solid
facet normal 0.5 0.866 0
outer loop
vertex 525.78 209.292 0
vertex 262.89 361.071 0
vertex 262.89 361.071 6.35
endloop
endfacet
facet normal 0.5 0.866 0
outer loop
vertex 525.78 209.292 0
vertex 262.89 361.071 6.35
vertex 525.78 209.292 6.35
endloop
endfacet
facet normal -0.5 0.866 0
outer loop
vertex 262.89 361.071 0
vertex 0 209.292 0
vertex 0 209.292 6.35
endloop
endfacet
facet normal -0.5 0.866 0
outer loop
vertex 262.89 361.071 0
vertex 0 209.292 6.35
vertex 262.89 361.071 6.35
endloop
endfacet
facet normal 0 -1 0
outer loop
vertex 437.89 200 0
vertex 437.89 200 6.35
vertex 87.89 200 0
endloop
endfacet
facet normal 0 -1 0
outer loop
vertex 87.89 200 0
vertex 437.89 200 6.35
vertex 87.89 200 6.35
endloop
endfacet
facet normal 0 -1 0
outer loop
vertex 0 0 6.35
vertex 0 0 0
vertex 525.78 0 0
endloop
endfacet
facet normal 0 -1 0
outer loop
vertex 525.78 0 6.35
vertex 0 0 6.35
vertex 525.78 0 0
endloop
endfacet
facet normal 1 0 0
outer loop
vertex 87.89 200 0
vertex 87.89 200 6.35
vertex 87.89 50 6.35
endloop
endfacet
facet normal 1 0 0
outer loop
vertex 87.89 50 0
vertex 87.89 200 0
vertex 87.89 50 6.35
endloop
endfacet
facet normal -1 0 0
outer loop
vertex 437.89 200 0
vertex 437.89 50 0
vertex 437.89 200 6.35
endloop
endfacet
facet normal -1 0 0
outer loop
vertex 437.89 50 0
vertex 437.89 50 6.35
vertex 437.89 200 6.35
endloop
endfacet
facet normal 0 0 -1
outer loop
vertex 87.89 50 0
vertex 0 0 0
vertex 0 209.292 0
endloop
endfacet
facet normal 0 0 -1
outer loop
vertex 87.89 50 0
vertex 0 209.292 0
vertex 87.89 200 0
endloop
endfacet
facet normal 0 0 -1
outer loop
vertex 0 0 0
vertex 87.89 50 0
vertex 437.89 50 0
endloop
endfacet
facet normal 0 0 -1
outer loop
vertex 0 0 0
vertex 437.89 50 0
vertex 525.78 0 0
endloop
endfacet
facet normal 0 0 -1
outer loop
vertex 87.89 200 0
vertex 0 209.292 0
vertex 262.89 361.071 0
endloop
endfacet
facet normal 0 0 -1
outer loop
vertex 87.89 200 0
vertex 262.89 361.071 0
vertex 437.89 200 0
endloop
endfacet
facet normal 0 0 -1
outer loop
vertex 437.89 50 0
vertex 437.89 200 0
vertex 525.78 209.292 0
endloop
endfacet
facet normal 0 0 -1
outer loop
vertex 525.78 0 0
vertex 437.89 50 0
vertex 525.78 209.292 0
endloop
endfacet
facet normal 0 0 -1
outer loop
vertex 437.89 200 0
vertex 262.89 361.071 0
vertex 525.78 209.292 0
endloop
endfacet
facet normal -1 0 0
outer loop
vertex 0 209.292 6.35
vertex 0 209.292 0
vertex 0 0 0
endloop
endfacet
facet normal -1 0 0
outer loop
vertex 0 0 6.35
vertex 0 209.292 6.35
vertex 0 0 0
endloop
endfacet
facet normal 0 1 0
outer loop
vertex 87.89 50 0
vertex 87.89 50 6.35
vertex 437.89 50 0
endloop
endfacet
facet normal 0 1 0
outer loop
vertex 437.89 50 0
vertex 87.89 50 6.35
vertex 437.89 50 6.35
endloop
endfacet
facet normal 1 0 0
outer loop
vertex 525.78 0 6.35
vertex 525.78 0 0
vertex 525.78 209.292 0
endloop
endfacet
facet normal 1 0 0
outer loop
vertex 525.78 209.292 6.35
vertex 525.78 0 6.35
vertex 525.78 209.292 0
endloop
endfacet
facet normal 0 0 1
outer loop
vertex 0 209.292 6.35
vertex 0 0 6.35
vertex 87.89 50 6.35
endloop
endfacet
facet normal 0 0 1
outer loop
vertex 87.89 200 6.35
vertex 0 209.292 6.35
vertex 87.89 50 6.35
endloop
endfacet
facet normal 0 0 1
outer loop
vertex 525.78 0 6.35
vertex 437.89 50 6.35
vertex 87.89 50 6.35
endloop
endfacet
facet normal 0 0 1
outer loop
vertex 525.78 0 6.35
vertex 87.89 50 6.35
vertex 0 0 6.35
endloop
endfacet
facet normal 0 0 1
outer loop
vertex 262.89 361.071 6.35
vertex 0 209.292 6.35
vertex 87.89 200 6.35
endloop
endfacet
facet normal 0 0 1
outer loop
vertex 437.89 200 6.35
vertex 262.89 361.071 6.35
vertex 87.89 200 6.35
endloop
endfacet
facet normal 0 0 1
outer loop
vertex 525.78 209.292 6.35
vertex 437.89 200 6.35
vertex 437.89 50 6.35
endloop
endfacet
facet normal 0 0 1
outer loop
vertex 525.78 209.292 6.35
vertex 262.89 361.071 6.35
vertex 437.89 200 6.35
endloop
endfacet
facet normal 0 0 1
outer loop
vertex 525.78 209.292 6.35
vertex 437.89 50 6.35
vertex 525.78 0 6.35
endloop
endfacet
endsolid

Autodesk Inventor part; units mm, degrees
ref_plane "YZ Plane" through (0, 0, 0) normal (1, 0, 0) x (0, 1, 0)
ref_plane "XZ Plane" through (0, 0, 0) normal (0, 1, 0) x (-1, 0, 0)
ref_plane "XY Plane" through (0, 0, 0) normal (0, 0, 1) x (1, 0, 0)
sketch "Sketch1" plane through (0, 0, 0) normal (0, 0, 1) x (1, 0, 0)
  line L0 (0, 0) -> (525.78, 0)
  line L1 (525.78, 0) -> (525.78, 209.2917)
  line L2 (525.78, 209.2917) -> (0, 209.2917)
  line L3 (0, 209.2917) -> (0, 0)
  line L4 (0, 209.2917) -> (262.89, 361.0713)
  line L5 (262.89, 361.0713) -> (525.78, 209.2917)
  point P0 (262.89, 209.2917)
  dimension "d0" = 525.78
  dimension "d1" = 209.2917
  dimension "d2" = 30
extrude "Extrusion1" add sketch "Sketch1" along normal blind 6.35
sketch "Sketch5" plane through (0, 0, 6.35) normal (0, 0, 1) x (1, 0, 0)
  line L0 (87.89, 50) -> (437.89, 50)
  line L1 (437.89, 50) -> (437.89, 200)
  line L2 (437.89, 200) -> (87.89, 200)
  line L3 (87.89, 200) -> (87.89, 50)
  line L4 (0, 0) -> (525.78, 0) projected
  point P0 (262.89, 200)
  point P1 (262.89, 361.0713)
  dimension "d16" = 350
  dimension "d17" = 150
  dimension "d21" = 50
extrude "Extrusion5" cut sketch "Sketch5" against normal through all
properties part number "BA10" material "ABS Plastic"
